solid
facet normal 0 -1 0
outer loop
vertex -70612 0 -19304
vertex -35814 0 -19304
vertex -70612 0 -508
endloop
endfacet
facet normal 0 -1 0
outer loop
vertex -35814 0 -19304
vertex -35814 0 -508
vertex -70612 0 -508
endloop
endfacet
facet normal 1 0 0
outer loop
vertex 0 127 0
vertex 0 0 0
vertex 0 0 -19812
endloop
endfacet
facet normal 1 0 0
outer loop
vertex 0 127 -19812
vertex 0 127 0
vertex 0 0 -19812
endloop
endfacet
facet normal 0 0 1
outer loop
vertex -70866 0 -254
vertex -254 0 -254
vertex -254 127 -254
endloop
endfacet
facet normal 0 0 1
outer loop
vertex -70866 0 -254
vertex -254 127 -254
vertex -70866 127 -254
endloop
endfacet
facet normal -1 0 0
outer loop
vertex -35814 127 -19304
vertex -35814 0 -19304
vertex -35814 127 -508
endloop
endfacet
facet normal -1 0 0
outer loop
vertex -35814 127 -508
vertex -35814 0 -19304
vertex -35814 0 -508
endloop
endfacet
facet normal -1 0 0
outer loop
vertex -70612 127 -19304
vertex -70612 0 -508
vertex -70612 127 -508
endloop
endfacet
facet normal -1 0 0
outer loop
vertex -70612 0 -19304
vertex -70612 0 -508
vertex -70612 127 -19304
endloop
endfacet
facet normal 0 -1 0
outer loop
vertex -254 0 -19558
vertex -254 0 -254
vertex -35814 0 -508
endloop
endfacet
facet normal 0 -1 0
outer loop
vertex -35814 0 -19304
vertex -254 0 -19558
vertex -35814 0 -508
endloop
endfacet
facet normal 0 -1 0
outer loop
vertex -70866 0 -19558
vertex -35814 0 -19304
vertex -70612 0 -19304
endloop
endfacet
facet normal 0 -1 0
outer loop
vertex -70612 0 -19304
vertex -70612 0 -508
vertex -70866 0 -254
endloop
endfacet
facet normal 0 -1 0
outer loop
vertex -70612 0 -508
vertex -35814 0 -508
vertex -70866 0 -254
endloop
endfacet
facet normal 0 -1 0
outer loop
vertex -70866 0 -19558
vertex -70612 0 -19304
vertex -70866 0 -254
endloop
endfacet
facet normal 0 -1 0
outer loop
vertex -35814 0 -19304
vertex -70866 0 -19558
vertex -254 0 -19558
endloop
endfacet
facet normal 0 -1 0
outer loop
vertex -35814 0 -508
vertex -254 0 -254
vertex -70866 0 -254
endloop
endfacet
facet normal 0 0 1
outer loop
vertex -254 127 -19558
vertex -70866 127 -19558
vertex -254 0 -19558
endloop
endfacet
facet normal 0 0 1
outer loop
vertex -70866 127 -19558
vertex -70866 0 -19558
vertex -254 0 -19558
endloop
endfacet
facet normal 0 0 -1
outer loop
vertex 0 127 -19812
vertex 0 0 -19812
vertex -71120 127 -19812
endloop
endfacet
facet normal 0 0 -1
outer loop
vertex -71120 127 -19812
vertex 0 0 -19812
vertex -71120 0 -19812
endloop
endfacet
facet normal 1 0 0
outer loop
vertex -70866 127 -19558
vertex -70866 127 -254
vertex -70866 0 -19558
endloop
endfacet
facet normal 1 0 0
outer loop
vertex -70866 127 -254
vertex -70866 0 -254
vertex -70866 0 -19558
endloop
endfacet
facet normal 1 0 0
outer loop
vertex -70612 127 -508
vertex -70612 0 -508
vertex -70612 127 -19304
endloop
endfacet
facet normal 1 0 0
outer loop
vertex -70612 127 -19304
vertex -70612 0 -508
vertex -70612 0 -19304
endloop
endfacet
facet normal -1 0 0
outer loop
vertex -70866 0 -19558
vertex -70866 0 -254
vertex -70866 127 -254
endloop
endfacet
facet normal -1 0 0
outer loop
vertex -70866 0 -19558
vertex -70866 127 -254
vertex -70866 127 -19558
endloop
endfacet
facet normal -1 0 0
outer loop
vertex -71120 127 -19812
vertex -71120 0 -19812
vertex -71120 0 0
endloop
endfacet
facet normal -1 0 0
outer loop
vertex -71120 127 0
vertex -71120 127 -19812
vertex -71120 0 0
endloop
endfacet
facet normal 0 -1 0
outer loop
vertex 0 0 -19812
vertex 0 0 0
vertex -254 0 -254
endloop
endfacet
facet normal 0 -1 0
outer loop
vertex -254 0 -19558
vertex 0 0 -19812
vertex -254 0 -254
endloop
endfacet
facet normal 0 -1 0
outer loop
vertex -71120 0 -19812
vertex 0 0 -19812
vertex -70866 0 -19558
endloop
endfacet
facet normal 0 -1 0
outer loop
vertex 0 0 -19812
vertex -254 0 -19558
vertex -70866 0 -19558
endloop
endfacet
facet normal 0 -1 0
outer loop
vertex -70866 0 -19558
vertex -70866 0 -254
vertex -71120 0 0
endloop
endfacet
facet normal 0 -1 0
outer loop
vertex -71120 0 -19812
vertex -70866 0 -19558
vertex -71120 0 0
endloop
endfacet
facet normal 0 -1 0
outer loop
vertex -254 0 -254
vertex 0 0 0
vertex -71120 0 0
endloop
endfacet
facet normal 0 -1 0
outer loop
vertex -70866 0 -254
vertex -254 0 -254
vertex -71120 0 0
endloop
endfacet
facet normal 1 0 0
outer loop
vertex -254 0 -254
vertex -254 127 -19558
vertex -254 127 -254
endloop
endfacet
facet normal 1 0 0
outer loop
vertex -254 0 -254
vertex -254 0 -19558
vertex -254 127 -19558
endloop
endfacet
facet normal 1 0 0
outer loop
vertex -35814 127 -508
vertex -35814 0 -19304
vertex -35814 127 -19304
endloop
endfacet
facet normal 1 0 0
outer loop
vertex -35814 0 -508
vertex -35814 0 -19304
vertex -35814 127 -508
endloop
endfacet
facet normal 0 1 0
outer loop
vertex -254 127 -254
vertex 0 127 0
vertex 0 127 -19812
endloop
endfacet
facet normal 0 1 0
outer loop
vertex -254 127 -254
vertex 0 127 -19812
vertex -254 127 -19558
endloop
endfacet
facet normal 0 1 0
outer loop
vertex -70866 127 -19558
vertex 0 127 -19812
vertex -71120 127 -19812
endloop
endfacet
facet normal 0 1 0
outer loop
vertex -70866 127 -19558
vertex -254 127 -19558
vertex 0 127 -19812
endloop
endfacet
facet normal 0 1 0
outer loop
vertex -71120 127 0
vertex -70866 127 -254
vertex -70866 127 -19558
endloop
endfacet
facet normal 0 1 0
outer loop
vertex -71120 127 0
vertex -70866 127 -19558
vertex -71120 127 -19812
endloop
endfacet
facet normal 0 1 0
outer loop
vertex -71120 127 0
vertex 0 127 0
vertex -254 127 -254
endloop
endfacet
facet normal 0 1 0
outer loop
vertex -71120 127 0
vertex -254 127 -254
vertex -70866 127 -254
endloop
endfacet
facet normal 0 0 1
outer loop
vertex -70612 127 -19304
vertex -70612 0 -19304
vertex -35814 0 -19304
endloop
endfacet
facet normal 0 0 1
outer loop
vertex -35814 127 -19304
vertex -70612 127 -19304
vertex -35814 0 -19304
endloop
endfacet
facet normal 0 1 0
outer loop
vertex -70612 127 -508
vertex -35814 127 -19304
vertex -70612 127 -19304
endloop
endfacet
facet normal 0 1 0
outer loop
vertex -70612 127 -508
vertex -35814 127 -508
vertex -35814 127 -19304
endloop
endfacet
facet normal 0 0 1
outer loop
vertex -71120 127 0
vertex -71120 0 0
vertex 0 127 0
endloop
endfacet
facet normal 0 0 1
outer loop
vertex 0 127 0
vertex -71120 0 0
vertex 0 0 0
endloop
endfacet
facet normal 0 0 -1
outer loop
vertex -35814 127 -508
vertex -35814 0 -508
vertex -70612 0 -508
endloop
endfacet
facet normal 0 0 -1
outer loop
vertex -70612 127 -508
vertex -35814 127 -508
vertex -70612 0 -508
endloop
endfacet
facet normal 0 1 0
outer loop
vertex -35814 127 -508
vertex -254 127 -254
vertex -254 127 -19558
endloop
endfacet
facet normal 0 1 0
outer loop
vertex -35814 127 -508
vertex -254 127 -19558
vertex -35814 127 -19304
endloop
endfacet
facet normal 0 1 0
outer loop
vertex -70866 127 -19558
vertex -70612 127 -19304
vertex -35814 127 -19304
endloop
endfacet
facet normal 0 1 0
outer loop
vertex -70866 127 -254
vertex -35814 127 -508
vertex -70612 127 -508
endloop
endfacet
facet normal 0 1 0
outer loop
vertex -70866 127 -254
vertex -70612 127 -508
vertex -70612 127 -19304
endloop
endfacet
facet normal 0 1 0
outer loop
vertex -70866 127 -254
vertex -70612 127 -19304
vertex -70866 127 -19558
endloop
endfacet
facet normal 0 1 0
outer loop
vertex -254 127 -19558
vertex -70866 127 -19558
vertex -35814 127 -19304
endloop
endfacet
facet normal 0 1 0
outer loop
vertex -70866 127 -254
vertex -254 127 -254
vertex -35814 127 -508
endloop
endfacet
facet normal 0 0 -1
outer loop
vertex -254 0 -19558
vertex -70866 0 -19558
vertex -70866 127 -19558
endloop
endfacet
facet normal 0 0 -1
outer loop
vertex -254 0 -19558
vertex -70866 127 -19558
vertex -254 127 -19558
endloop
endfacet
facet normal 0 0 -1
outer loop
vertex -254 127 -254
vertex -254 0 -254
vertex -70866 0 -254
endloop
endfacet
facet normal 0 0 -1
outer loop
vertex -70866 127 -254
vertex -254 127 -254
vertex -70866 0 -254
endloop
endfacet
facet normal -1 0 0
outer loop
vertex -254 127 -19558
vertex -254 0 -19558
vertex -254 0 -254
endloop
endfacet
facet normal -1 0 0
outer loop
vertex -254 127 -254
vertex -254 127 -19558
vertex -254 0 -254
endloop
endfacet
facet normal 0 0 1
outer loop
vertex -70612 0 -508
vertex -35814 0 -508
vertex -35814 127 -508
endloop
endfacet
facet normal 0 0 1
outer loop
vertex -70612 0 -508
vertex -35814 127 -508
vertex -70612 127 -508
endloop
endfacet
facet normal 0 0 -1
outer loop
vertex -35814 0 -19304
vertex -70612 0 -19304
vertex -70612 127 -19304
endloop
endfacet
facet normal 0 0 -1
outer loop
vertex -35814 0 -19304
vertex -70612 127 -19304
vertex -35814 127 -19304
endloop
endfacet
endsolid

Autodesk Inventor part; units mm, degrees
ref_plane "YZ Plane" through (0, 0, 0) normal (1, 0, 0) x (0, 1, 0)
ref_plane "XZ Plane" through (0, 0, 0) normal (0, 1, 0) x (-1, 0, 0)
ref_plane "XY Plane" through (0, 0, 0) normal (0, 0, 1) x (1, 0, 0)
sketch "Sketch2" plane through (0, 0, 0) normal (0, 1, 0) x (-1, 0, 0)
  line L0 (0, -19812) -> (71120, -19812)
  line L1 (71120, -19812) -> (71120, 0)
  line L2 (71120, 0) -> (0, 0)
  line L3 (0, 0) -> (0, -19812)
  line L4 (70866, -19558) -> (254, -19558)
  line L5 (254, -19558) -> (254, -254)
  line L6 (254, -254) -> (70866, -254)
  line L7 (70866, -254) -> (70866, -19558)
  line L8 (70612, -19304) -> (35814, -19304)
  line L9 (35814, -19304) -> (35814, -508)
  line L10 (35814, -508) -> (70612, -508)
  line L11 (70612, -508) -> (70612, -19304)
extrude "Extrusion5" add sketch "Sketch2" along normal blind 127 contours L8 L9 L10 L11
extrude "Extrusion6" add sketch "Sketch2" along normal blind 127 separate body contours L4 L5 L6 L7
extrude "Extrusion7" add sketch "Sketch2" along normal blind 127 separate body contours L3 L2 L1 L0
sketch "Sketch3" plane through (0, 127, 0) normal (0, 1, 0) x (1, 0, 0)
  line L0 (-70611.9965, 19304.0005) -> (-35813.9997, 19304.0005) construction
  line L1 (-35813.9997, 19304.0005) -> (-35813.9997, 508.0003) construction
  line L2 (-35813.9997, 508.0003) -> (-70611.9965, 508.0003) construction
  line L3 (-70611.9965, 508.0003) -> (-70611.9965, 19304.0005) construction
  line L4 (-59884.5661, 19644.4587) -> (-25086.5693, 19644.4587) construction
  line L5 (-35100.5062, 19367.5189) -> (-759.9701, 19367.5189) construction
  line L6 (-759.9701, 19367.5189) -> (-759.9701, 812.5507) construction
  line L7 (-759.9701, 812.5507) -> (-35100.5062, 812.5507) construction
  line L8 (-35100.5062, 812.5507) -> (-35100.5062, 19367.5189) construction
  point P0 (0, 0)
sketch "Sketch4" plane through (0, 127, 0) normal (0, 1, 0) x (1, 0, 0)
  line L0 (-71188.0311, 20022.5548) -> (-35706.4205, 20022.5548) construction
  line L1 (-35706.4205, 20022.5548) -> (-35706.4205, 258.2634) construction
  line L2 (-35706.4205, 258.2634) -> (-71188.0311, 258.2634) construction
  line L3 (-71188.0311, 258.2634) -> (-71188.0311, 20022.5548) construction
  point P0 (0, 0)
properties part number "banner"
